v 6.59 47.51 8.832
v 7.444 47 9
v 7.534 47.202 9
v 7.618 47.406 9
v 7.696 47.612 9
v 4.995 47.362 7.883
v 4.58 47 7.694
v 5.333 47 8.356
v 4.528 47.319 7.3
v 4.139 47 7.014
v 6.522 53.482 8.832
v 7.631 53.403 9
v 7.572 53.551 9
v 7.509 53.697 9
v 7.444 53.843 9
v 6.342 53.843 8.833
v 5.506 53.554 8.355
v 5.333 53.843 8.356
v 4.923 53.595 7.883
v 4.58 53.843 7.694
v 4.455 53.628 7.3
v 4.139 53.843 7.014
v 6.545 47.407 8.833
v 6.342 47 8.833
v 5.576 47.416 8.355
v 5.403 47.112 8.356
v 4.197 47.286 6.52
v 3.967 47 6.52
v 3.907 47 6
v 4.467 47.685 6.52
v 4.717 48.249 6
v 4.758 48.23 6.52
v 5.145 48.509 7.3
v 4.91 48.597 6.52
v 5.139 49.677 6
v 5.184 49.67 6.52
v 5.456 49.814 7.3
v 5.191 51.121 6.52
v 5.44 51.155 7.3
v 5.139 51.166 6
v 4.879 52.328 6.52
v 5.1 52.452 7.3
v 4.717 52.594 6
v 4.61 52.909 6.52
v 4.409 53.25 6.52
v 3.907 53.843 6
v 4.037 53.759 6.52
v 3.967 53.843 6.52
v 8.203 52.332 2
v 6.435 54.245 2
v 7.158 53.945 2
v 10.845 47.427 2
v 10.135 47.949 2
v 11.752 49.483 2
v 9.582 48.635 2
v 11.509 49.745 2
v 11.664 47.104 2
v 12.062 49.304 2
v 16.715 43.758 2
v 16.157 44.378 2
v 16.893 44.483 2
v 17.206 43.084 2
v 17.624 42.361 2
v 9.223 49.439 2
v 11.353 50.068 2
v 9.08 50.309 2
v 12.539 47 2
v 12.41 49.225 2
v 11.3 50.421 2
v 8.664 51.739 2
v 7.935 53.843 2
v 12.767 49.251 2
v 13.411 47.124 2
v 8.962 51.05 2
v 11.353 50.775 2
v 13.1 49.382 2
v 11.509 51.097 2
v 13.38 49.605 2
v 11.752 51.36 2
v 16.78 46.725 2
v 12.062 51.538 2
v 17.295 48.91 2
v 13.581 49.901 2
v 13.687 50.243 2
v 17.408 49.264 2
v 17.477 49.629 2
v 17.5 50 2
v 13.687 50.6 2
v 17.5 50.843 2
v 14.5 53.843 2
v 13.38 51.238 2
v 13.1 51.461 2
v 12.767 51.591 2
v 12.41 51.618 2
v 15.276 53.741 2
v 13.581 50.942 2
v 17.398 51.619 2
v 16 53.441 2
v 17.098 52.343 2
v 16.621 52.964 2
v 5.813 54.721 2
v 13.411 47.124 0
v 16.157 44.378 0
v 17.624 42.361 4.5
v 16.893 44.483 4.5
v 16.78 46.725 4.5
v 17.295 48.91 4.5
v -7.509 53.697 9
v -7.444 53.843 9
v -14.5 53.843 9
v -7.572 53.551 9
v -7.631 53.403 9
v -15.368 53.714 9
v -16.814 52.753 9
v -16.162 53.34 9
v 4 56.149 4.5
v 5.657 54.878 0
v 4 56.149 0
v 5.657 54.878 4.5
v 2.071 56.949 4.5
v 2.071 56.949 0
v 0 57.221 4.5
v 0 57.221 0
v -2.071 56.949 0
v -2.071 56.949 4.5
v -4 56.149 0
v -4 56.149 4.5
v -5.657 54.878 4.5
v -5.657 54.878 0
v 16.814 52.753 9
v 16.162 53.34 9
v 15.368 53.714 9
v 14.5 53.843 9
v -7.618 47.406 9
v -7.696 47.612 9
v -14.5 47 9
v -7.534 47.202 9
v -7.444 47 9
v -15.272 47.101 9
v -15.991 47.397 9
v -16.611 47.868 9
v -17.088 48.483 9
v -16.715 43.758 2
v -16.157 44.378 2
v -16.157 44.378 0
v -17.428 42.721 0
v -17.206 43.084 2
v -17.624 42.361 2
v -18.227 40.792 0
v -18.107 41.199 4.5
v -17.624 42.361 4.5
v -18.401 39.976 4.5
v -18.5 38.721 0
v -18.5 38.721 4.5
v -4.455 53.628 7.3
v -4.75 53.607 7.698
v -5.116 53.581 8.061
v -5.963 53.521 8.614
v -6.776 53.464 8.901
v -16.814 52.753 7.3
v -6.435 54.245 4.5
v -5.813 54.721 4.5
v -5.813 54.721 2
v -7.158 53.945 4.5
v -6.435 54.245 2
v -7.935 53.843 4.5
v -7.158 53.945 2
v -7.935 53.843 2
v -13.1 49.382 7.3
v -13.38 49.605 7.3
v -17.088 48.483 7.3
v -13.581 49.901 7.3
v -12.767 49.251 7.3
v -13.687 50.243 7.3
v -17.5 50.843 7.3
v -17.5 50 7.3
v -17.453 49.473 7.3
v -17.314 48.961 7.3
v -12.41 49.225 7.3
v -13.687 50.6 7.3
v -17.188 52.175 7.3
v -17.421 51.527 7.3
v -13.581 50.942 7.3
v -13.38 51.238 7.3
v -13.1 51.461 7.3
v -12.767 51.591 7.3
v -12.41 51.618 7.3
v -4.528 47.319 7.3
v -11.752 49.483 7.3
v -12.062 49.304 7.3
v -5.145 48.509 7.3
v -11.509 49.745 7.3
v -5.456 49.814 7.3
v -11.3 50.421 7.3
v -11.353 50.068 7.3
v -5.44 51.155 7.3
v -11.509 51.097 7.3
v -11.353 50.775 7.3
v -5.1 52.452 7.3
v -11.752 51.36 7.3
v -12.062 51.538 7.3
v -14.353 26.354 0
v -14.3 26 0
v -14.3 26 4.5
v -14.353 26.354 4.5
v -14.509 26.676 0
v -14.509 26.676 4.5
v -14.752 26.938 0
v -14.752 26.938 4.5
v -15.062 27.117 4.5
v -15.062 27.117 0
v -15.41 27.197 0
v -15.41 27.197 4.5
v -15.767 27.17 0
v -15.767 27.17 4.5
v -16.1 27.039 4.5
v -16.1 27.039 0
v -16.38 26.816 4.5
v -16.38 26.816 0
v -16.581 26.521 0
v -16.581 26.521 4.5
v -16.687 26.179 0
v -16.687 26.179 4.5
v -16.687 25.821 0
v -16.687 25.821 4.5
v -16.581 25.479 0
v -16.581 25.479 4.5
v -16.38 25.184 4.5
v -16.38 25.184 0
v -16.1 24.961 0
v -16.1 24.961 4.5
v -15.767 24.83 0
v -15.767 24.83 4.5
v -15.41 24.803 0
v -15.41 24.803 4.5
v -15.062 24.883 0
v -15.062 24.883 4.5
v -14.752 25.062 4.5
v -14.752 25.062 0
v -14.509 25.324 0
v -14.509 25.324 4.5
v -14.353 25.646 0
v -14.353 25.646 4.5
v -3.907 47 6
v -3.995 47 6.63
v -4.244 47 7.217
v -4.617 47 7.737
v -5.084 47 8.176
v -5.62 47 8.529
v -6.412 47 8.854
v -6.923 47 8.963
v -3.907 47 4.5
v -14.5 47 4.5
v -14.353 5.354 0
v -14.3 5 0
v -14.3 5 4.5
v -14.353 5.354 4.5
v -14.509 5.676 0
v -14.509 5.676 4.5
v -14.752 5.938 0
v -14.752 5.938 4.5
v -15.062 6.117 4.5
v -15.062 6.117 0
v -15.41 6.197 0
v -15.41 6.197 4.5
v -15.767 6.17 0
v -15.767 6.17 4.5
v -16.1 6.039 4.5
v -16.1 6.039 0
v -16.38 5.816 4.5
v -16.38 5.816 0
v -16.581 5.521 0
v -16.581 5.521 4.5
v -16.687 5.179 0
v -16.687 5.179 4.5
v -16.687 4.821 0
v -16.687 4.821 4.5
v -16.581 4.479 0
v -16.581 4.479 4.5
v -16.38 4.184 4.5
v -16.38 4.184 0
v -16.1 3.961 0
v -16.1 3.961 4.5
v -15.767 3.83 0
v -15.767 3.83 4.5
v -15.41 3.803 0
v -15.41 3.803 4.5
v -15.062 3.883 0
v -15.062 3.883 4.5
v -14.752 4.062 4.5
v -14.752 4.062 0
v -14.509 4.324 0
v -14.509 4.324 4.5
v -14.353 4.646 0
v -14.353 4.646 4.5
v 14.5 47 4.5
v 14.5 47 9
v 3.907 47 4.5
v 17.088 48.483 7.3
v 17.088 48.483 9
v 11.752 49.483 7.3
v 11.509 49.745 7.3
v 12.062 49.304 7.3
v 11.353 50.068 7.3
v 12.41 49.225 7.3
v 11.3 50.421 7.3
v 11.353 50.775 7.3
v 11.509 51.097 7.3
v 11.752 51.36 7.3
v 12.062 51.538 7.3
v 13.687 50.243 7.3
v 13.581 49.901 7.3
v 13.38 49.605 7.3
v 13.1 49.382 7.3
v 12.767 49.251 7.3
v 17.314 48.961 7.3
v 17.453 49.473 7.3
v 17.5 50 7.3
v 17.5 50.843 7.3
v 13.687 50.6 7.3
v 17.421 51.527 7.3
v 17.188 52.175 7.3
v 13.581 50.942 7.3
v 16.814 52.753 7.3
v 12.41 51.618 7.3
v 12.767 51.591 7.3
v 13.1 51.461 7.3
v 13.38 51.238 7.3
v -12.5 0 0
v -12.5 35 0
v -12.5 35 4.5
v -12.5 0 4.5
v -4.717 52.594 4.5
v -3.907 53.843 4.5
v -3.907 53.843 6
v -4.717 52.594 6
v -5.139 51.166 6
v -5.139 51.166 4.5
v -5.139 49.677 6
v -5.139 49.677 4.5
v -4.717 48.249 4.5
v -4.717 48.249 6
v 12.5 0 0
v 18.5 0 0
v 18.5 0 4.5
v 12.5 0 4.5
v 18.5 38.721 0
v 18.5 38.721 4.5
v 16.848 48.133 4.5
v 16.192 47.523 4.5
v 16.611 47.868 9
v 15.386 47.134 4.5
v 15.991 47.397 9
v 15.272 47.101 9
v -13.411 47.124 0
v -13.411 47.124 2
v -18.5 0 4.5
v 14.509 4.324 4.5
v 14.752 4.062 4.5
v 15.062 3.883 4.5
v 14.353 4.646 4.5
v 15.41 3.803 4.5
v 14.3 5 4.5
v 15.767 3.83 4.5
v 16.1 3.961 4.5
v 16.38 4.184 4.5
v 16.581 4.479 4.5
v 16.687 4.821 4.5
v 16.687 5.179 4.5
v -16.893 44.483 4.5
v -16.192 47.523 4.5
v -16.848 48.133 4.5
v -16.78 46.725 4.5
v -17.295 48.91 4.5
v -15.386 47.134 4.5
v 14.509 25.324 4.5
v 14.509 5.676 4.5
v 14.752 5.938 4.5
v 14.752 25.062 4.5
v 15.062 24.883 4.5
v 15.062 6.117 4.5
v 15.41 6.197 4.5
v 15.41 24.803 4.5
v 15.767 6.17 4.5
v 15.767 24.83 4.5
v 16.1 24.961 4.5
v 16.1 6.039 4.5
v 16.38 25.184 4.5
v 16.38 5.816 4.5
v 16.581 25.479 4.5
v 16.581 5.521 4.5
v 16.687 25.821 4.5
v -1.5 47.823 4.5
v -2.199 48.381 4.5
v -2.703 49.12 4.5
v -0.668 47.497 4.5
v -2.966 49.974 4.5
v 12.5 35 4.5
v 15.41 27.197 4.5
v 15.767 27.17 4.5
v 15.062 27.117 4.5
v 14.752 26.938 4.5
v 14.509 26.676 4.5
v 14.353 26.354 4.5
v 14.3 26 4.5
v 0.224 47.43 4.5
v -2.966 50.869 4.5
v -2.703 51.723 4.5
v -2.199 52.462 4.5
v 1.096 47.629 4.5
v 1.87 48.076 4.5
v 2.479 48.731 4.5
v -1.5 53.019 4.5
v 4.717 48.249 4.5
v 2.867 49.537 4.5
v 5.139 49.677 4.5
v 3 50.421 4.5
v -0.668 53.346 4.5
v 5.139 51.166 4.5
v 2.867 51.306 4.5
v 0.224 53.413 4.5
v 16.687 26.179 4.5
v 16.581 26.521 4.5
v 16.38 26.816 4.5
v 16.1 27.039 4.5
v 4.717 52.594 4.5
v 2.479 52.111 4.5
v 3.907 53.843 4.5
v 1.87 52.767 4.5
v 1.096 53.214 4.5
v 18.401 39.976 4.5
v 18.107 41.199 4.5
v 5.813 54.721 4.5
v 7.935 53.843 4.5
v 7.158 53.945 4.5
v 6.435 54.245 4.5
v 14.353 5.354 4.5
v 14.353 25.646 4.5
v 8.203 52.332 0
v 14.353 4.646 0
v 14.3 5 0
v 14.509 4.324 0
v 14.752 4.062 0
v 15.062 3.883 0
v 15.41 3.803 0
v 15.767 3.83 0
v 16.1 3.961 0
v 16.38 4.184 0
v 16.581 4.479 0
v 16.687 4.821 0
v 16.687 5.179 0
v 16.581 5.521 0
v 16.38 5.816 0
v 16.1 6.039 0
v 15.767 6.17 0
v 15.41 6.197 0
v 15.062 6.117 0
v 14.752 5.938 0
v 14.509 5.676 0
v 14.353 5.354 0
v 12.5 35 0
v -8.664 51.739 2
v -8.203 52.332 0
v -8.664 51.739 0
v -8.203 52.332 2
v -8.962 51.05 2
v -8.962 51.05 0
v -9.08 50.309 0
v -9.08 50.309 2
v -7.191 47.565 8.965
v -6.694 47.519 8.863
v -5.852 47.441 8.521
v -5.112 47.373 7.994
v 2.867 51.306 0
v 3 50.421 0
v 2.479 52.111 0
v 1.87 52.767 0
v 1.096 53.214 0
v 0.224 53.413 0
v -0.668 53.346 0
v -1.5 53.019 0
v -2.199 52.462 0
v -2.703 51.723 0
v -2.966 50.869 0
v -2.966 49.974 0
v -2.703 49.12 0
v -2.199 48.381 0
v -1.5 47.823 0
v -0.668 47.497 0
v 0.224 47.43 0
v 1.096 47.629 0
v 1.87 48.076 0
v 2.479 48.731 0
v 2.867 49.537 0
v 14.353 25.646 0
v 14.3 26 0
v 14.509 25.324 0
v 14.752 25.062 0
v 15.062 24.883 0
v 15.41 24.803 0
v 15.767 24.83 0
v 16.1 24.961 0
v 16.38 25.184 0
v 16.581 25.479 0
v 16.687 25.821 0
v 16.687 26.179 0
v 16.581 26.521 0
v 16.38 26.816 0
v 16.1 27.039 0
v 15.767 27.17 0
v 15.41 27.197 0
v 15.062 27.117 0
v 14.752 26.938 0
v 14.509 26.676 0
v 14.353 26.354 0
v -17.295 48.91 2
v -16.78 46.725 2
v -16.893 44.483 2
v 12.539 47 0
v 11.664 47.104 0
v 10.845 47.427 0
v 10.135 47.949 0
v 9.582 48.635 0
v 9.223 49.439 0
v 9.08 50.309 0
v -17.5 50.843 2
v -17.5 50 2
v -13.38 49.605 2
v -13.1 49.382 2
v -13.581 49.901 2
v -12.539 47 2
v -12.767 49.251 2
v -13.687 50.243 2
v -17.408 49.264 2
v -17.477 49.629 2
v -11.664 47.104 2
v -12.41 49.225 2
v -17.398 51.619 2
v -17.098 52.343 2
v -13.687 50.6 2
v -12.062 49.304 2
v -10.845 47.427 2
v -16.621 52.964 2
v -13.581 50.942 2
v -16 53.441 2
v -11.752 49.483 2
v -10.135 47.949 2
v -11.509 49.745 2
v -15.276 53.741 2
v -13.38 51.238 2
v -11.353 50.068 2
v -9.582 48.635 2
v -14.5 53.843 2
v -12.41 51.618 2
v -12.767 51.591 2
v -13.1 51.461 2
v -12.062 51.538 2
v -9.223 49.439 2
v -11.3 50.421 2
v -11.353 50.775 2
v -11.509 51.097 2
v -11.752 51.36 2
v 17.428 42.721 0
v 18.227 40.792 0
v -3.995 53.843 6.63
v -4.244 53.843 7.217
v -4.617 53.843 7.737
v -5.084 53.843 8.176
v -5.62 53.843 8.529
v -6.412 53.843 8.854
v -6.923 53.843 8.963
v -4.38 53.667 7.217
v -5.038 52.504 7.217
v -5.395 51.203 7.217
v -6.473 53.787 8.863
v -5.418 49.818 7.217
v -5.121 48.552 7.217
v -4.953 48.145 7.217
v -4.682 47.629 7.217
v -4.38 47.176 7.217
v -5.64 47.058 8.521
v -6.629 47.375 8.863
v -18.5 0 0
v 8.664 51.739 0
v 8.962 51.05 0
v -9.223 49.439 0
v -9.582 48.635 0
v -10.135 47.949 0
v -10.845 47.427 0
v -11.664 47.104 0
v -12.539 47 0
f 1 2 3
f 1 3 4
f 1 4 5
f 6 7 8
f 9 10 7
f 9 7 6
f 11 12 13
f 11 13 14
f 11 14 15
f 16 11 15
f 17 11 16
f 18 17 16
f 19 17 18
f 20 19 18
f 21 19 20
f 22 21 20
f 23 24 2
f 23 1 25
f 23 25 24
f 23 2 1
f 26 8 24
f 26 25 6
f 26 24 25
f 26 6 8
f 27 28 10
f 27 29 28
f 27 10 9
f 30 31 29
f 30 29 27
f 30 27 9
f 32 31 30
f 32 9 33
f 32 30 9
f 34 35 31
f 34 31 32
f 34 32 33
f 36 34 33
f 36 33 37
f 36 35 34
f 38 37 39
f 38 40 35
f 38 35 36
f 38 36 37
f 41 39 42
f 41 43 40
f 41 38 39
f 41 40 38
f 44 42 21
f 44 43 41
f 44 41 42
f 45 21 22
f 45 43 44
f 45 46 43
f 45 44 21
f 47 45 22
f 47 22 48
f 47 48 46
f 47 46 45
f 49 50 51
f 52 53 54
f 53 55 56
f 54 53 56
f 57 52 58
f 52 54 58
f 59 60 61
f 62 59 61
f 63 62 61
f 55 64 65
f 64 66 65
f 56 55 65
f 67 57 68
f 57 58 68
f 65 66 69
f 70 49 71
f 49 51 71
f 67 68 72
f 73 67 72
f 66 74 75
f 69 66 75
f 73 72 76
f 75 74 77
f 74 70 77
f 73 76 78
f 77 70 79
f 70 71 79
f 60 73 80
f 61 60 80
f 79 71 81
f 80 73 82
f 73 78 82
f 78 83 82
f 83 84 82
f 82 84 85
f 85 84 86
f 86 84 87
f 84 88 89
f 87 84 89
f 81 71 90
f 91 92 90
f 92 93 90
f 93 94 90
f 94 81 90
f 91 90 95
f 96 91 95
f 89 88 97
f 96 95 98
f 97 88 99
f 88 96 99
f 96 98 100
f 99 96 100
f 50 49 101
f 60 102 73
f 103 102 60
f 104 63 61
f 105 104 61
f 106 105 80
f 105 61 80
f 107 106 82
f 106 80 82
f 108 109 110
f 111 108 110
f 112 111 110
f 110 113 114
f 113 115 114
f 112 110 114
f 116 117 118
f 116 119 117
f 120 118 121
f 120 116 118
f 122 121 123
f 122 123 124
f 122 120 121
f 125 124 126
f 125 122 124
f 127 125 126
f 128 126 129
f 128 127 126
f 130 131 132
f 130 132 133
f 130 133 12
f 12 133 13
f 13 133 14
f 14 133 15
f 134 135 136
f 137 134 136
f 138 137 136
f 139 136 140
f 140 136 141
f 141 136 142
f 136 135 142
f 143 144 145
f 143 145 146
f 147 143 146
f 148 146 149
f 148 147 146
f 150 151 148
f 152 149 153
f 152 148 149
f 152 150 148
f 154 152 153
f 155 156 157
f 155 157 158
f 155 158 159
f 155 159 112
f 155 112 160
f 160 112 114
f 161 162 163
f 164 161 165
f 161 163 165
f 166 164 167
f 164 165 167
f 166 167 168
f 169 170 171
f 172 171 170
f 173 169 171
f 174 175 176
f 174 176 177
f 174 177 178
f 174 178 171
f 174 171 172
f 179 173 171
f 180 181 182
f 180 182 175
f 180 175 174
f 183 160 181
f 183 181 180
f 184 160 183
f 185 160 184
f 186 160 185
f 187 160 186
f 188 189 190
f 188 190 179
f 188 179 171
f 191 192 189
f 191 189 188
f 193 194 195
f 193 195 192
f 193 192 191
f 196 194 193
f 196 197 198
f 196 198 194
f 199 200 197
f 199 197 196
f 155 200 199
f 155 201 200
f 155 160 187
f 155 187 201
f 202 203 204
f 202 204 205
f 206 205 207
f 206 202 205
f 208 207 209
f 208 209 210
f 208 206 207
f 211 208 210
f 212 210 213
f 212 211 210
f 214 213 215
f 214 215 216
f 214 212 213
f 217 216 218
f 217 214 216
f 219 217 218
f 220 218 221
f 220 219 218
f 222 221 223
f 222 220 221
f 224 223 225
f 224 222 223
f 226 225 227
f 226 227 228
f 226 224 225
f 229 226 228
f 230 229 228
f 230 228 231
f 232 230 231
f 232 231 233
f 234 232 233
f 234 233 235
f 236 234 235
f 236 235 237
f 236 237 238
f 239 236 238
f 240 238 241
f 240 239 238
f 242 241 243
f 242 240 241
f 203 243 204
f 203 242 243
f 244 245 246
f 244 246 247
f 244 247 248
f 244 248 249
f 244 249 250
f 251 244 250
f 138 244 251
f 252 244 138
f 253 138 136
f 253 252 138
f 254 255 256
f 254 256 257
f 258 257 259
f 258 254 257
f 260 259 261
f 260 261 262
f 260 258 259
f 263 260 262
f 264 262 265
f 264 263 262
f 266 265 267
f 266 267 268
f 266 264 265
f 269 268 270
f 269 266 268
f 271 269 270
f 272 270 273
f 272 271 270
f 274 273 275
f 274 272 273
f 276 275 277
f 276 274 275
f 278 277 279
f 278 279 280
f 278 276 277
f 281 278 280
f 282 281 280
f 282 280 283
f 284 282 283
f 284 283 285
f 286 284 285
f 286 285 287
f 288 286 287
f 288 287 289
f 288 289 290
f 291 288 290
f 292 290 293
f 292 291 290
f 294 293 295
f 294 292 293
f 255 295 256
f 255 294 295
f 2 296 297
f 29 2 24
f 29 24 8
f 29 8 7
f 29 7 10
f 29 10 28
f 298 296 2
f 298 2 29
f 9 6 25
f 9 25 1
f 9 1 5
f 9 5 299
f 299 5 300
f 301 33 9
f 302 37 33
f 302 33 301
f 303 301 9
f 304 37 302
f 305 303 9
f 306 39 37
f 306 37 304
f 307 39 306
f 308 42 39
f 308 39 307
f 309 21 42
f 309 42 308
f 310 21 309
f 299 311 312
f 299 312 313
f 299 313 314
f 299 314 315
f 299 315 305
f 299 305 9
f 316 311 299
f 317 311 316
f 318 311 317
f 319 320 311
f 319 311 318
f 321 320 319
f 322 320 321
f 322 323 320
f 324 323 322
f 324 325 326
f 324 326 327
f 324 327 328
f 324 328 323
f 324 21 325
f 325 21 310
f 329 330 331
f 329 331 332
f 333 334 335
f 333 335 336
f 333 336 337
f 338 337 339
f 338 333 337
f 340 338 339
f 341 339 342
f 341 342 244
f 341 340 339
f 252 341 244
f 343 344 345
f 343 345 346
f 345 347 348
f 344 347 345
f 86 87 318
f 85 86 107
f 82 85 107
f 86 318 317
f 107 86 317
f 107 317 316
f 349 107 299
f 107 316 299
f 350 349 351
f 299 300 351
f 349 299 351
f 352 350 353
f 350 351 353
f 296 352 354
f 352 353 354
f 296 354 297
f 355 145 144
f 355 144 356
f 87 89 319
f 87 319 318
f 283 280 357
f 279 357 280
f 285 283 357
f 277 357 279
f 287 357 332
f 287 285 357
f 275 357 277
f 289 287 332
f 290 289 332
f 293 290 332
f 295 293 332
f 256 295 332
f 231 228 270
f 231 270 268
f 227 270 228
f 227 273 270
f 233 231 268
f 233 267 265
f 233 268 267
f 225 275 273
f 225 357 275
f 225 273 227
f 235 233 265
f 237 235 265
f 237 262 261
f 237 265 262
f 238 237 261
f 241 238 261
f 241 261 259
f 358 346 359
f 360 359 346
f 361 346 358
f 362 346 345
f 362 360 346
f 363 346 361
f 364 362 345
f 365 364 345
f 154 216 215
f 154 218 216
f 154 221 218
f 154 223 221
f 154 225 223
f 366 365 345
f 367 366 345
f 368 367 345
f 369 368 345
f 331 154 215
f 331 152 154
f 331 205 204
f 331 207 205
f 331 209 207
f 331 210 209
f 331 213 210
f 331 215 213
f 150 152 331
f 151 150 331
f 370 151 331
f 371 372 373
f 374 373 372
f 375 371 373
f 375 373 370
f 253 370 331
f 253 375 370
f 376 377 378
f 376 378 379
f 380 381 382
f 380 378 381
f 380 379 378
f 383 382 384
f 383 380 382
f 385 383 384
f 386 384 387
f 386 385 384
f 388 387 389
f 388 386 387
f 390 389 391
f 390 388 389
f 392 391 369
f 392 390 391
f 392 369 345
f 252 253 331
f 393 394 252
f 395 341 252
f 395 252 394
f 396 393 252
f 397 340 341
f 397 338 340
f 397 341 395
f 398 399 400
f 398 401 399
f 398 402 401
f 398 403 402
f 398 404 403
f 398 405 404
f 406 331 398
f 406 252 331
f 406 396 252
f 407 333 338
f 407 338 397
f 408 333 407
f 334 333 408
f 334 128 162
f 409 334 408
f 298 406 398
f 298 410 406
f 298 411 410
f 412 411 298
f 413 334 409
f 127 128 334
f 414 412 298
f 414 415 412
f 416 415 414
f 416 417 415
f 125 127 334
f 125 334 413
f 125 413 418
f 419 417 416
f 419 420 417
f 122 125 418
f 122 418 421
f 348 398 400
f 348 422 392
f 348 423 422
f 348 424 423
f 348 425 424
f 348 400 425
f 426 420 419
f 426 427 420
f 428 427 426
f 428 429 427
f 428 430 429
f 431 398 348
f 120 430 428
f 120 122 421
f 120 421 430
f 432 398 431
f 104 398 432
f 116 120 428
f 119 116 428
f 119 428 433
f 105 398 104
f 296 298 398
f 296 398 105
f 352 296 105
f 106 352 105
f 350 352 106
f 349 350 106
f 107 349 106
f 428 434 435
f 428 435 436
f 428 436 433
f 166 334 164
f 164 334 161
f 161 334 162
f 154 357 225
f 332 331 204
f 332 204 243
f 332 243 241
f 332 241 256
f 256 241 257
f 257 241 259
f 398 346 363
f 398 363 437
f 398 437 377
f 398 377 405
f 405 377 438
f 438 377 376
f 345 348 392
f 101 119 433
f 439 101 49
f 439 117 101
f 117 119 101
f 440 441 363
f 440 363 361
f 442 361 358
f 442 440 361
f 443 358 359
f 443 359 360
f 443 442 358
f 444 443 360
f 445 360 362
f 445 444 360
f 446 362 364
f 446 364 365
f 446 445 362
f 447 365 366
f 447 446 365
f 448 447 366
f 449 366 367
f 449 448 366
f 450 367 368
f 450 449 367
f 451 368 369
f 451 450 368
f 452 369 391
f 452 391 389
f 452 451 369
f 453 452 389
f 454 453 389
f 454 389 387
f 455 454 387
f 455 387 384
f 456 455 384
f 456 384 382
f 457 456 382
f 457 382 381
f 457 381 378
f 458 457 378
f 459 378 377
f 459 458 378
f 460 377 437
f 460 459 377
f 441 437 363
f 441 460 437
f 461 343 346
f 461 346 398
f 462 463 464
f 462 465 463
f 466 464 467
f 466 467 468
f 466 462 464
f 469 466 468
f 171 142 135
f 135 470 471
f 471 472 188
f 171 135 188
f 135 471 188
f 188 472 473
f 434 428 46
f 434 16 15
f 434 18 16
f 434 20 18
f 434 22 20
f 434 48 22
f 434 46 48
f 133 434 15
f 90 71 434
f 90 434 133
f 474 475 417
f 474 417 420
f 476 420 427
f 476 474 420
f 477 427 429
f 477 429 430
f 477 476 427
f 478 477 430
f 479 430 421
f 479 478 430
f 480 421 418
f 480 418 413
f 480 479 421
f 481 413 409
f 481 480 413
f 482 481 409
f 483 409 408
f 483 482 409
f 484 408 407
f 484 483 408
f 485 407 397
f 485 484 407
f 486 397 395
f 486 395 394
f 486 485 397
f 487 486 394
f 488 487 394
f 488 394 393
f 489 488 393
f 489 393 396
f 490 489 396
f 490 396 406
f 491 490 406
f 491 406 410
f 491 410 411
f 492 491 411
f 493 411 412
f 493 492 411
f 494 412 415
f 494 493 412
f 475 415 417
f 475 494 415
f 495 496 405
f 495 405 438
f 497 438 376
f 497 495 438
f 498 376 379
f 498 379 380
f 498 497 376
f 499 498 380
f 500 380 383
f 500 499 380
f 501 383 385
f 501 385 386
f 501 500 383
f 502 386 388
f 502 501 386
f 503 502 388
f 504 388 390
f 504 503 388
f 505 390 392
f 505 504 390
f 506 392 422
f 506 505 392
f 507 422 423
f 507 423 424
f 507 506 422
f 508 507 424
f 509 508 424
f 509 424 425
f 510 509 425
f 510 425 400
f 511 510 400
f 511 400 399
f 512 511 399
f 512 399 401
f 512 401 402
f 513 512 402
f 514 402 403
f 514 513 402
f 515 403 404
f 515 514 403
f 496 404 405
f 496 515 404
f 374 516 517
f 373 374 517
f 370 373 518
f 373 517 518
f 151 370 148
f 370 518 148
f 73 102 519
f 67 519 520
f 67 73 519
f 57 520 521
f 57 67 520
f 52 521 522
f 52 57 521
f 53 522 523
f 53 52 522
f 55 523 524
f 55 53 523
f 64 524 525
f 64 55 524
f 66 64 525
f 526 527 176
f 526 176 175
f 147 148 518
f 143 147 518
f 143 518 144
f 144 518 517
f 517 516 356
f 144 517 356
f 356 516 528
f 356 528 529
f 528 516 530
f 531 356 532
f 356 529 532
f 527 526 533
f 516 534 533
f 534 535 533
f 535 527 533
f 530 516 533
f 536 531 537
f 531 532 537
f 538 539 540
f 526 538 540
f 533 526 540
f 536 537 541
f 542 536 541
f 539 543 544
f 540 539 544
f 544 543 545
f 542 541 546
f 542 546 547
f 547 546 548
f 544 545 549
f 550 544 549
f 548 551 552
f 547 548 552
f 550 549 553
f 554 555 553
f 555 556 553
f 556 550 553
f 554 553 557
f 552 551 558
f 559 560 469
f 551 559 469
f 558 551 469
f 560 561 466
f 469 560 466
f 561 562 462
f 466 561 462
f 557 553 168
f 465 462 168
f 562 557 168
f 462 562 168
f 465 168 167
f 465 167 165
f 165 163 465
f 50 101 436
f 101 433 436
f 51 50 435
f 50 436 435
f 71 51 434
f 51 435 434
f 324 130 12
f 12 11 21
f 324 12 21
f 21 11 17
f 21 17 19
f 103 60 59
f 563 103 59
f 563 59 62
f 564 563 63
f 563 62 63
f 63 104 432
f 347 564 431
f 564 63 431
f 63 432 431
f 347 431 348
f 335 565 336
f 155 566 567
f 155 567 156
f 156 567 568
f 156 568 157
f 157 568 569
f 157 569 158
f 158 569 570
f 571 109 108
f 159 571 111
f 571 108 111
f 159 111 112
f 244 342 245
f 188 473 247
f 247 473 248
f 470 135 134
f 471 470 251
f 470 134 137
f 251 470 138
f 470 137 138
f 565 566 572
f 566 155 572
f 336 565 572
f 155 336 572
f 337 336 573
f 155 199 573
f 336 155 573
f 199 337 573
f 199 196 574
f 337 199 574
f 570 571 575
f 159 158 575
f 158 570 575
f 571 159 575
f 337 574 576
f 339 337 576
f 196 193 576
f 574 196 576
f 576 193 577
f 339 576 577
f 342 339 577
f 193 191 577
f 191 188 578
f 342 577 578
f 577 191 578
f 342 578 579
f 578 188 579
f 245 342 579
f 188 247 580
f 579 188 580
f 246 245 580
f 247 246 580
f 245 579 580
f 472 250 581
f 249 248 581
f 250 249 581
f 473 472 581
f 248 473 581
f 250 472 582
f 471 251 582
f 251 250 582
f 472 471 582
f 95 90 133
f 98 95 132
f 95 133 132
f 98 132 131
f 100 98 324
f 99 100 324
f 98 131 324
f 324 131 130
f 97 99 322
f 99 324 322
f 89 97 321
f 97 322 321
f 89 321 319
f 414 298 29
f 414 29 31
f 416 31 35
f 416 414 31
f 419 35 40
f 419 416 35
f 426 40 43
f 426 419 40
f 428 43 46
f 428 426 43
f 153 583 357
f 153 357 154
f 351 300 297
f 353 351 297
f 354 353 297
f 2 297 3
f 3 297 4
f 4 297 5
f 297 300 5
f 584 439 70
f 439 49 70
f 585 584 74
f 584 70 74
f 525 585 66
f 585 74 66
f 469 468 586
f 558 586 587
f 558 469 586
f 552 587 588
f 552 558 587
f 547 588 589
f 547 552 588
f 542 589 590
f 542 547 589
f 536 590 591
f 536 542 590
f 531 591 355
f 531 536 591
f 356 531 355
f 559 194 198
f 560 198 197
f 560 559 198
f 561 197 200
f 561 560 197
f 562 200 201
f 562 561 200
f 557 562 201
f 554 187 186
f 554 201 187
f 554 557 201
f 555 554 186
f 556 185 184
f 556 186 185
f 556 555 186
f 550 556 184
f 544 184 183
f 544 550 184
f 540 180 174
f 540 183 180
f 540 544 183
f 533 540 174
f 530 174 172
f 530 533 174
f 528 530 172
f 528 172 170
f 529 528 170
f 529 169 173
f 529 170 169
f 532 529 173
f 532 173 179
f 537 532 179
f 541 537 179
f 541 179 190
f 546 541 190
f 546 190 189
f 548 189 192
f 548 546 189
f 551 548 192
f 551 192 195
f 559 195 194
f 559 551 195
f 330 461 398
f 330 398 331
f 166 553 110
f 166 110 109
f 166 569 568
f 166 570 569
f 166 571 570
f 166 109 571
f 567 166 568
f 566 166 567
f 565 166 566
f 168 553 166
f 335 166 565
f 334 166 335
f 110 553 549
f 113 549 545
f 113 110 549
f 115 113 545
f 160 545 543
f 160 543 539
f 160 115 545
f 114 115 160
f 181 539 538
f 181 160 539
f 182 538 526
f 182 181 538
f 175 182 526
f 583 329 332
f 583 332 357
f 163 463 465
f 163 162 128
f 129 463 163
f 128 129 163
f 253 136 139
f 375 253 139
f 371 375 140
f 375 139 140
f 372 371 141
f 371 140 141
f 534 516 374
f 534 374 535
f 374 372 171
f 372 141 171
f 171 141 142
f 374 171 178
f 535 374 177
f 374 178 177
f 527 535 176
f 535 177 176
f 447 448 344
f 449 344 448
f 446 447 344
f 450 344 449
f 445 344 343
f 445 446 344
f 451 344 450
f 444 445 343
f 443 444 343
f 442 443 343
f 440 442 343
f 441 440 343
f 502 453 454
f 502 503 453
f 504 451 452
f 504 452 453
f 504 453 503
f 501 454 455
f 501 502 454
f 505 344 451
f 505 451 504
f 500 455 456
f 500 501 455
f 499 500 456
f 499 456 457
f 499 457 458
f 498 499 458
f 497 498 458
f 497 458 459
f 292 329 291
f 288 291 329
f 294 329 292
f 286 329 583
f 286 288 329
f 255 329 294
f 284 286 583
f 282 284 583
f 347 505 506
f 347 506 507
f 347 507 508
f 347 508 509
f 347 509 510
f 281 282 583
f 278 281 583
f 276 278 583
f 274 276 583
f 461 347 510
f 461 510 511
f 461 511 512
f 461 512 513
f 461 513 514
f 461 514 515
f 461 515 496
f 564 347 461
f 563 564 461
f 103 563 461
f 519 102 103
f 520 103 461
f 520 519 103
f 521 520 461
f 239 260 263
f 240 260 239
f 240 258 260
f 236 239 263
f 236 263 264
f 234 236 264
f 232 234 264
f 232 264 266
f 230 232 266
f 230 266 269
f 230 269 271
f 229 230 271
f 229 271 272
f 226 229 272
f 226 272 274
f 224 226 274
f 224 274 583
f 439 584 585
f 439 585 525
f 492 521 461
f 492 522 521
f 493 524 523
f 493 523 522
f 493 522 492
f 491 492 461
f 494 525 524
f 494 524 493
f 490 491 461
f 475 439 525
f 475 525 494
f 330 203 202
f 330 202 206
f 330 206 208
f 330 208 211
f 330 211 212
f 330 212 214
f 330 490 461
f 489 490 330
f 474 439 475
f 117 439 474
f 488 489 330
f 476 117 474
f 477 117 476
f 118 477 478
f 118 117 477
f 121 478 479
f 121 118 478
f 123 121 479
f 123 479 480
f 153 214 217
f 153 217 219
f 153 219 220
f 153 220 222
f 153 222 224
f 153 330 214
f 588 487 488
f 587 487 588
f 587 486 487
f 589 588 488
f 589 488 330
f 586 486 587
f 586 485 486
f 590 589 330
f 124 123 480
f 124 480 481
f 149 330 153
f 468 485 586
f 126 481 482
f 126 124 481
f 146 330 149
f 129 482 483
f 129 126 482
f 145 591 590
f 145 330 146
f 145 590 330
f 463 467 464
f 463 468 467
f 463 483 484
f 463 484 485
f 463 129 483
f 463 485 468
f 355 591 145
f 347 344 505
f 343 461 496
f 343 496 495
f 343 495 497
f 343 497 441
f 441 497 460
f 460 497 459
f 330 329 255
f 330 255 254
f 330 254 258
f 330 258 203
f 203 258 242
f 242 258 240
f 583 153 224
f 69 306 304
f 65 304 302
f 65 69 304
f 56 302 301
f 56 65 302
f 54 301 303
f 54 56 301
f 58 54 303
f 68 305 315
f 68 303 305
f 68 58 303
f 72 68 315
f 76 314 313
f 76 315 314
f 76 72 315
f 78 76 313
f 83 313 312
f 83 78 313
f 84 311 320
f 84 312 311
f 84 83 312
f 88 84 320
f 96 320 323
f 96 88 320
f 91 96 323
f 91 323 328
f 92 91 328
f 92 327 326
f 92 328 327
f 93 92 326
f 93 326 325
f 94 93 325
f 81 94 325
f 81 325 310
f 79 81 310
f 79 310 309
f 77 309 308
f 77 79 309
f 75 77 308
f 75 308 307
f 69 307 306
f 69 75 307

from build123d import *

# Parameters (mm, degrees)
SKETCH_1_R           = 3
SKETCH_1_R_2         = 1.2
EXTRUDE_1_DEPTH      = 4.5
EXTRUDE_2_DEPTH      = 4.5
EXTRUDE_2_DEPTH_BACK = 2.5
SKETCH_2_R           = 1.2
FILLET_1_R           = 8
CUT_EXTRUDE_1_REACH  = 62.544
SKETCH_3_R           = 3.421397557
FILLET_2_R           = 3
CUT_EXTRUDE_2_DEPTH  = 1.7
FILLET_START         = 2
FILLET_3_DEPTH       = 2.5


with BuildPart() as part:
    # 草图1 → 凸台-拉伸1 (new body)
    with BuildSketch(Plane.XY):
        Polygon((-12.5, 0), (-18.5, 0), (-18.5, 42.034916596), (0, 60.534916596), (18.5, 42.034916596), (18.5, 0), (12.5, 0), (12.5, 35), (-12.5, 35), align=None)
        with Locations((0, 50.421397557)):
            Circle(SKETCH_1_R, mode=Mode.SUBTRACT)
        with Locations((-15.5, 5)):
            Circle(SKETCH_1_R_2, mode=Mode.SUBTRACT)
        with Locations((-15.5, 26)):
            Circle(SKETCH_1_R_2, mode=Mode.SUBTRACT)
        with Locations(Location((15.5, 5, 0), (0, 0, 180))):
            Circle(SKETCH_1_R_2, mode=Mode.SUBTRACT)
        with Locations(Location((15.5, 26, 0), (0, 0, 180))):
            Circle(SKETCH_1_R_2, mode=Mode.SUBTRACT)
    extrude(amount=EXTRUDE_1_DEPTH)

    # 草图2 → 凸台-拉伸2 (add, two sides: drawn at the far end of the back side and taken through both)
    # profile 1 of 2: a face of its own
    with BuildSketch(Plane.XY.offset(4.5).offset(-EXTRUDE_2_DEPTH_BACK)):
        with BuildLine():
            Line((17.5, 47), (3.906515802, 47))
            ThreePointArc((3.906515802, 47), (5.192959363, 50.421397557), (3.906515802, 53.842795113))
            Line((3.906515802, 53.842795113), (17.5, 53.842795113))
            Line((17.5, 53.842795113), (17.5, 47))
        make_face()
        with Locations(Location((12.5, 50.421397557, 0), (0, 0, 180))):
            Circle(SKETCH_2_R, mode=Mode.SUBTRACT)
    # profile 2 of 2: a face of its own
    with BuildSketch(Plane.XY.offset(4.5).offset(-EXTRUDE_2_DEPTH_BACK)):
        with BuildLine():
            Line((-17.5, 47), (-17.5, 53.842795113))
            Line((-17.5, 53.842795113), (-3.906515802, 53.842795113))
            ThreePointArc((-3.906515802, 53.842795113), (-5.192959363, 50.421397557), (-3.906515802, 47))
            Line((-3.906515802, 47), (-17.5, 47))
        make_face()
        with Locations((-12.5, 50.421397557)):
            Circle(SKETCH_2_R, mode=Mode.SUBTRACT)
    extrude(amount=EXTRUDE_2_DEPTH + EXTRUDE_2_DEPTH_BACK)

    # 圆角1
    fillet_1_edges = [part.edges().sort_by_distance(p)[0] for p in [
        (-18.5, 42.034916596, 2.25),
        (0, 60.534916596, 2.25),
        (18.5, 42.034916596, 2.25),
    ]]
    fillet(fillet_1_edges, radius=FILLET_1_R)

    # 草图3 → 切除-拉伸1 (cut, up to next)
    with BuildSketch(Plane(origin=(0, 0, 2), x_dir=(-1, 0, 0), z_dir=(0, 0, -1)), mode=Mode.PRIVATE) as cut_extrude_1_sk1:
        with Locations((-12.5, 50.421397557)):
            Circle(SKETCH_3_R)
    cut_extrude_1_tool1 = extrude(cut_extrude_1_sk1.sketch, amount=CUT_EXTRUDE_1_REACH, mode=Mode.PRIVATE) & part.part
    # 草图3 → 切除-拉伸1 (cut, up to next)
    with BuildSketch(Plane(origin=(0, 0, 2), x_dir=(-1, 0, 0), z_dir=(0, 0, -1)), mode=Mode.PRIVATE) as cut_extrude_1_sk2:
        with Locations((12.5, 50.421397557)):
            Circle(SKETCH_3_R)
    cut_extrude_1_tool2 = extrude(cut_extrude_1_sk2.sketch, amount=CUT_EXTRUDE_1_REACH, mode=Mode.PRIVATE) & part.part
    add(cut_extrude_1_tool1.solids().sort_by_distance((12.5, 50.421398, 2))[0], mode=Mode.SUBTRACT)
    add(cut_extrude_1_tool2.solids().sort_by_distance((-12.5, 50.421398, 2))[0], mode=Mode.SUBTRACT)

    # 圆角2
    fillet_2_edges = [part.edges().sort_by_distance(p)[0] for p in [
        (9.202203088, 51.332713509, 1),
        (-9.202203088, 51.332713509, 1),
        (-6.692121483, 53.842795113, 3.25),
        (-17.5, 47, 5.5),
        (-5.192959363, 50.421397557, 9),
        (-17.5, 53.842795113, 5.5),
        (6.692121483, 53.842795113, 3.25),
        (17.5, 53.842795113, 5.5),
        (5.192959363, 50.421397557, 9),
        (17.5, 47, 5.5),
    ]]
    fillet(fillet_2_edges, radius=FILLET_2_R)

    # 草图4 → 切除-拉伸2 (cut)
    with BuildSketch(Plane.XY.offset(9)):
        Polygon((0, 46.899022366), (43.079074711, 50.891584803), (0, 53.943772747), (-43.079074711, 50.891584803), align=None)
    extrude(amount=-CUT_EXTRUDE_2_DEPTH, mode=Mode.SUBTRACT)

    # 圆角3: read off the stored shape, not the designer's step
    # 圆角3 outline → 圆角3 (add)
    with BuildSketch(Plane.XY.offset(FILLET_START)):
        with BuildLine():
            ThreePointArc((17.623806552, 42.361452624), (16.757691875, 45.600251323), (17.294803574, 48.909553768))
            ThreePointArc((17.294803574, 48.909553768), (16.192433353, 47.52297167), (14.5, 47))
            Line((14.5, 47), (13.534916596, 47))
            Line((13.534916596, 47), (16.156854249, 44.378062347))
            ThreePointArc((16.156854249, 44.378062347), (16.969389563, 43.42726788), (17.623806552, 42.361452624))
        make_face()
        with BuildLine():
            ThreePointArc((-14.5, 47), (-16.192433353, 47.52297167), (-17.294803574, 48.909553768))
            ThreePointArc((-17.294803574, 48.909553768), (-16.757691875, 45.600251323), (-17.623806552, 42.361452624))
            ThreePointArc((-17.623806552, 42.361452624), (-16.969389563, 43.42726788), (-16.156854249, 44.378062347))
            Line((-16.156854249, 44.378062347), (-13.534916596, 47))
            Line((-13.534916596, 47), (-14.5, 47))
        make_face()
    extrude(amount=FILLET_3_DEPTH)


solid = part.part
